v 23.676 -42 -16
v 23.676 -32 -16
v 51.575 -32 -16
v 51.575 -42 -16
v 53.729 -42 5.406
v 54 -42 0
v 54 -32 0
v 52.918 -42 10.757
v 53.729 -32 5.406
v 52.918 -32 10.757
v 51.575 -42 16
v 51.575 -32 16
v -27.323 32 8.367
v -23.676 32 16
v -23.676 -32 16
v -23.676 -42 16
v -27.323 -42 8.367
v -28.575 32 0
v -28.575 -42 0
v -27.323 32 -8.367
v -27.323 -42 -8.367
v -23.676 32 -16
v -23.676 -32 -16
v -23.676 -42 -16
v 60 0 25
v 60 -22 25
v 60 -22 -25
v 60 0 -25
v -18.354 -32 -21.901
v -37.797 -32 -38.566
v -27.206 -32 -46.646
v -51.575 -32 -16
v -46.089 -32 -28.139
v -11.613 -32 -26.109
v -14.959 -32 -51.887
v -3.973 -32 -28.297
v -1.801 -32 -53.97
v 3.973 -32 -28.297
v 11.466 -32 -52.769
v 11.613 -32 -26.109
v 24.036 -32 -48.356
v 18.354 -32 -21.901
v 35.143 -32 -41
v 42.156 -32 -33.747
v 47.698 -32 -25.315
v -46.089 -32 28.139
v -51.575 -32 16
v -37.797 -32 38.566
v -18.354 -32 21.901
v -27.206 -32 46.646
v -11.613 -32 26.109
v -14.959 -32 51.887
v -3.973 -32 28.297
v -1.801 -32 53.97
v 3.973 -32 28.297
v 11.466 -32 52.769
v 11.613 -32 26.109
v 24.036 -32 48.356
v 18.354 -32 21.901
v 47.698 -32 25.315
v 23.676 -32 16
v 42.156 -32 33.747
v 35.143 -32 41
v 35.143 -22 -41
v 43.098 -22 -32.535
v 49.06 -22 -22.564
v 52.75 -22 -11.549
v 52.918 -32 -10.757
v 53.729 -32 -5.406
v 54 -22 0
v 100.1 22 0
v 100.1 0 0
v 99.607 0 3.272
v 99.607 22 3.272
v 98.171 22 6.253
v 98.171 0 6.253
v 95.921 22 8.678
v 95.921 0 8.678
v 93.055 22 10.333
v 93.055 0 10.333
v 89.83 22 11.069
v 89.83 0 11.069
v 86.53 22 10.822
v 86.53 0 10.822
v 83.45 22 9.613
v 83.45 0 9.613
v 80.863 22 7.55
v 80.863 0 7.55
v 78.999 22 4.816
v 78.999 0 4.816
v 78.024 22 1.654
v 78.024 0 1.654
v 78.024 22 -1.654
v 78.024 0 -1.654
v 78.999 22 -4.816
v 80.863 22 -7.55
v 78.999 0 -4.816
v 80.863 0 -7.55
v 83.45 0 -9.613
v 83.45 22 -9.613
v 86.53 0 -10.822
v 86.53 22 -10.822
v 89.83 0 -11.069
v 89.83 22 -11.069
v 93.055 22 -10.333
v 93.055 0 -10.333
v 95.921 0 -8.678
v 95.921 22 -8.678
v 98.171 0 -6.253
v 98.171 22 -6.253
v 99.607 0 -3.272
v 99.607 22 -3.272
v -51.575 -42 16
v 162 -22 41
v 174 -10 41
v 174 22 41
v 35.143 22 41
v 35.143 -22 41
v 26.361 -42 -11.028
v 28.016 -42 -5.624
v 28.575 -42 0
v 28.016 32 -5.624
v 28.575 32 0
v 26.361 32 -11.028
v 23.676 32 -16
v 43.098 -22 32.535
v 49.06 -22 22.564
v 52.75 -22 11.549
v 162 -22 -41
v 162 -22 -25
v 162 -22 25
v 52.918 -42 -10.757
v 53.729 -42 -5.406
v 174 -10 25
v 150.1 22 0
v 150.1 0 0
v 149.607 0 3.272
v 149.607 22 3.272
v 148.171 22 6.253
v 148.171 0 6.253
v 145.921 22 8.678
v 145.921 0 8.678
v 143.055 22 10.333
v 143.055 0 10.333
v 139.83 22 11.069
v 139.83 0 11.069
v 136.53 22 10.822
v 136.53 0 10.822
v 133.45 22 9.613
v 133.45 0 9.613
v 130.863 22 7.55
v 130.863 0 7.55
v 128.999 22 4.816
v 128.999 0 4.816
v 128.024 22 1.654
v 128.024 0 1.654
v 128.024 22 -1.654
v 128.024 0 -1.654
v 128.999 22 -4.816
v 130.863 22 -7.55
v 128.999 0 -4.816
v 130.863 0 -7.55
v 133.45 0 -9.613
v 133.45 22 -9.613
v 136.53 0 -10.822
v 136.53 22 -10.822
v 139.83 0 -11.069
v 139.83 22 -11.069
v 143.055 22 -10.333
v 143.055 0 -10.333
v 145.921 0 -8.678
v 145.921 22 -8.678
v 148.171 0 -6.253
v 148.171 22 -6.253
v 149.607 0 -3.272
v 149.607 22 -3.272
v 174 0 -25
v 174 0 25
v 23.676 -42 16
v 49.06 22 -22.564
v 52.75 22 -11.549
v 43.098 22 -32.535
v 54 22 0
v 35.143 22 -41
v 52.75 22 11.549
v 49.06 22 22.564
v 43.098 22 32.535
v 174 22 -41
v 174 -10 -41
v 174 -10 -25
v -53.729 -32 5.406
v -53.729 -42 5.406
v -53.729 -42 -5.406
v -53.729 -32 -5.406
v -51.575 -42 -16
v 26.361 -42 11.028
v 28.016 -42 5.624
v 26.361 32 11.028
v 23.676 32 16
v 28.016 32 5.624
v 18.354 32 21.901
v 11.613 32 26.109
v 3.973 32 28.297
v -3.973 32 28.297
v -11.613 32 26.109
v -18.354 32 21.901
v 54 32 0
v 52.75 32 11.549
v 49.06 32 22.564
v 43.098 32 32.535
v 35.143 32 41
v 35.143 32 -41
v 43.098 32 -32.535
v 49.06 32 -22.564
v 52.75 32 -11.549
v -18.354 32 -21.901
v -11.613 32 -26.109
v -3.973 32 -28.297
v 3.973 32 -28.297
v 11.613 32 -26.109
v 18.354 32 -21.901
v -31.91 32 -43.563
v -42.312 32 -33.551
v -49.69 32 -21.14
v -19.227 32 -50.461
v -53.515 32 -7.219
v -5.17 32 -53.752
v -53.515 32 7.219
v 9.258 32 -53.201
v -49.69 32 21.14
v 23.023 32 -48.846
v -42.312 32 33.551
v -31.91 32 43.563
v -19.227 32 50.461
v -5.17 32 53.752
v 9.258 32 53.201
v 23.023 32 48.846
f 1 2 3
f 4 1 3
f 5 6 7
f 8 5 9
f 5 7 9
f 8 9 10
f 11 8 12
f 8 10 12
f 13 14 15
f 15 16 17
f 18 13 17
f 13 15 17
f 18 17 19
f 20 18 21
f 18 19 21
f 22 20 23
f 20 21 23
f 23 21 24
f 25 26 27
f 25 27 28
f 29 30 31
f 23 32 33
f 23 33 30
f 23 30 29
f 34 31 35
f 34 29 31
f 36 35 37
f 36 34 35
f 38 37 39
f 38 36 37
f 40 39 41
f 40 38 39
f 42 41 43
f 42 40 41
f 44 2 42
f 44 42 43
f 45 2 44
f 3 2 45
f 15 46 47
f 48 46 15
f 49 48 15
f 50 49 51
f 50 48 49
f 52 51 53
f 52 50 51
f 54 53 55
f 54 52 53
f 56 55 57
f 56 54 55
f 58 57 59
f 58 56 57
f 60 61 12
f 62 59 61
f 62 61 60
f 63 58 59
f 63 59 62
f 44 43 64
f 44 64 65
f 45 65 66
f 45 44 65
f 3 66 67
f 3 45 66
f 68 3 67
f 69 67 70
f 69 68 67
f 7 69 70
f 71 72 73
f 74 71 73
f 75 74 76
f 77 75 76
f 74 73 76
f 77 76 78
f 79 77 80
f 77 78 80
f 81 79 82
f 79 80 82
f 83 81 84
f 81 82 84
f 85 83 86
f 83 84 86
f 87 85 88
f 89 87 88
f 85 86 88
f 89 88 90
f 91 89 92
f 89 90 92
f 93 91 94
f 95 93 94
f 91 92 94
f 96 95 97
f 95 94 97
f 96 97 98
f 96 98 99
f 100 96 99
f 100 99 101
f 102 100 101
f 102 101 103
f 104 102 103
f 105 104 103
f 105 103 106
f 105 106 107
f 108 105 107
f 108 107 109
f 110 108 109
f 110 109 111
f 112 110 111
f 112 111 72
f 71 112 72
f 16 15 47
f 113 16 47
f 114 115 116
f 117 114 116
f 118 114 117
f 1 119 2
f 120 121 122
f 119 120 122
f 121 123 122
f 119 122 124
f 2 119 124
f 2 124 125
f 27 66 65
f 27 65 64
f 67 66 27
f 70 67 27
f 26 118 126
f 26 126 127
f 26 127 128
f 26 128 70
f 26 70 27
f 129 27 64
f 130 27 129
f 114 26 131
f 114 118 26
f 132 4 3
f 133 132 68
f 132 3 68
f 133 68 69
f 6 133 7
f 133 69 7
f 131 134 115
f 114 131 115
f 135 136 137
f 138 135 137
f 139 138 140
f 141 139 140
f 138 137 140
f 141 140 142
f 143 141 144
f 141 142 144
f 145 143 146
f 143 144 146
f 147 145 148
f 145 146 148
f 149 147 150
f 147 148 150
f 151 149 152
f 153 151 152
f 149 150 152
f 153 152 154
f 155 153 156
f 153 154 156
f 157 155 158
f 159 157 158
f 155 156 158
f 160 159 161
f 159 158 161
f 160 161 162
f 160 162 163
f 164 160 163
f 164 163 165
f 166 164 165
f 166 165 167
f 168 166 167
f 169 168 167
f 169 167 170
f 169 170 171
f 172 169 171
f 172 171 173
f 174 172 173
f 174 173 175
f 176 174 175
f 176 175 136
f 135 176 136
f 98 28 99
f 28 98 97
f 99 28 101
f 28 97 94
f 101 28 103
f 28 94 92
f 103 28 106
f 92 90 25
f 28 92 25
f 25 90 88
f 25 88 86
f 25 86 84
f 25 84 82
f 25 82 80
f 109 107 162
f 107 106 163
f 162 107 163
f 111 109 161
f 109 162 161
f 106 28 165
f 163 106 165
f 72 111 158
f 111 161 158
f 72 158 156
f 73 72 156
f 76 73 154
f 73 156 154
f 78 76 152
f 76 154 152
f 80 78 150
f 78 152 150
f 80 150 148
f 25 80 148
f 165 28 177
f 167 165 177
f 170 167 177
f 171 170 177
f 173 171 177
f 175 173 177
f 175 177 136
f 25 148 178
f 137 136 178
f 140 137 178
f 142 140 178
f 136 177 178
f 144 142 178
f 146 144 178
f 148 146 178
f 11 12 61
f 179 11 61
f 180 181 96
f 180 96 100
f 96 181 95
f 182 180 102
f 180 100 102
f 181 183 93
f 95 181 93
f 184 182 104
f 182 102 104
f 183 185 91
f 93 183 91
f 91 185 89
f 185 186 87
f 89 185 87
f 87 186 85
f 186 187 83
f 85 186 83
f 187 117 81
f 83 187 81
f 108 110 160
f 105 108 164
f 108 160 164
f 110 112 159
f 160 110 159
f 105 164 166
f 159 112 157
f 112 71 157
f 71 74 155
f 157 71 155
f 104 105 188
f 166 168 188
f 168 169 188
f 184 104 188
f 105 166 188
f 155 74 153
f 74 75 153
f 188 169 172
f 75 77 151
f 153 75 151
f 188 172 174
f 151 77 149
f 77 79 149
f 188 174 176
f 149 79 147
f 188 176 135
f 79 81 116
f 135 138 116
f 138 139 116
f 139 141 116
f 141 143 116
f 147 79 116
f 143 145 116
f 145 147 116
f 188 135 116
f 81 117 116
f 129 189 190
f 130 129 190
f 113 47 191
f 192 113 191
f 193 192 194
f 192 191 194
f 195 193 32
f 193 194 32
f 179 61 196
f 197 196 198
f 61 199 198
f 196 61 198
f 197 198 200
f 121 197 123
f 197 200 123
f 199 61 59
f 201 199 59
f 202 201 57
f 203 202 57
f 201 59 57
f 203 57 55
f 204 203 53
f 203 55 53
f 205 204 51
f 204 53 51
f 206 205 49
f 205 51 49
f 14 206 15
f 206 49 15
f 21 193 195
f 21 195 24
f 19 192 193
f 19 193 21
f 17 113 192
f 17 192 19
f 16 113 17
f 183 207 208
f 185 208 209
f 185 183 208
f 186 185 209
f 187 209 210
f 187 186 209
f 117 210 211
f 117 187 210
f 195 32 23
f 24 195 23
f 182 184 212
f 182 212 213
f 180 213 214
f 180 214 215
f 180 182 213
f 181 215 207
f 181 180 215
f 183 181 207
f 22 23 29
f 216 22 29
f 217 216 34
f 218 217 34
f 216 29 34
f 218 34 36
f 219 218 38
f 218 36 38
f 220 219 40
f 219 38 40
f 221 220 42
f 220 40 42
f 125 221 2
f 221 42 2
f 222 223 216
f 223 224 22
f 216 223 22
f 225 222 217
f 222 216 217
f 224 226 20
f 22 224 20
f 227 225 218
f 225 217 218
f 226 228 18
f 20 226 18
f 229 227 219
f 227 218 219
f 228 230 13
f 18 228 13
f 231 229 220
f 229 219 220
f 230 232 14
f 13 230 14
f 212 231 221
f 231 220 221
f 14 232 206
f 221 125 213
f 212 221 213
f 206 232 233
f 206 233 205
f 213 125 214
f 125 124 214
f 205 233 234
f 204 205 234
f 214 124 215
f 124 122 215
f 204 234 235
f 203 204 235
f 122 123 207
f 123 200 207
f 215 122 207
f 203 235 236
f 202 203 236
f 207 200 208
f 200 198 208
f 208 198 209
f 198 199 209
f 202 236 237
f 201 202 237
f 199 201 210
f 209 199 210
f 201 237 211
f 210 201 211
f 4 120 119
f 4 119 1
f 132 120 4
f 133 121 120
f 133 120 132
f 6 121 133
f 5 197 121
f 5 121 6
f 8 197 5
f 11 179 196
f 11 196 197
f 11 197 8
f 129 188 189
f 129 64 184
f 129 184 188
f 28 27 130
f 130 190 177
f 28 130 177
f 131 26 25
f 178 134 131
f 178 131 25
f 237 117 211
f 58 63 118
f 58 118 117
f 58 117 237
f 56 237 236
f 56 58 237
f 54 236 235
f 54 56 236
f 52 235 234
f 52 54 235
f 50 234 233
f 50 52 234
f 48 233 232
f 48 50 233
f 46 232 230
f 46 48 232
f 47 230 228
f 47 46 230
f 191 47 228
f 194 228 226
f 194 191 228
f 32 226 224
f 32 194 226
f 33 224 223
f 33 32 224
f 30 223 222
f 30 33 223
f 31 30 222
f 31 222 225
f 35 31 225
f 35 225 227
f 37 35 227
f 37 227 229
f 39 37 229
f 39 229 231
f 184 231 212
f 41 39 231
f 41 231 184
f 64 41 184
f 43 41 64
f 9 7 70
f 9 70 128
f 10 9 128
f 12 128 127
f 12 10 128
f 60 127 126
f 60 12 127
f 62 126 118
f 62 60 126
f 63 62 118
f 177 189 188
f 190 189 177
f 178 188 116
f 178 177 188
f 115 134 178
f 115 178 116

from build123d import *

# Parameters (mm, degrees)
F1_DEPTH  = 22
F0_R      = 28.575
F2_DEPTH  = 32
F3_W      = 22
F3_H      = 50
F4_DEPTH  = 114
F5_R      = 11.1
F6_DEPTH  = 32.001
F8_DEPTH  = 10
F9_DEPTH  = 64.001
F10_SIZE2 = 12
F10_SIZE  = 12


with BuildPart() as f1:
    # F0 (on Front) → F1 (new body, symmetric)
    with BuildSketch(Plane.XZ):
        with BuildLine():
            ThreePointArc((35.142567, 41), (49.05965, 22.564368), (54, 0))
            ThreePointArc((54, 0), (49.05965, -22.564368), (35.142567, -41))
            Line((35.142567, -41), (174, -41))
            Line((174, -41), (174, 41))
            Line((174, 41), (35.142567, 41))
        make_face()
    extrude(amount=F1_DEPTH, both=True)

    # F0 (on Front) → F2 (join, symmetric)
    with BuildSketch(Plane.XZ):
        with BuildLine():
            ThreePointArc((35.142567, -41), (49.05965, -22.564368), (54, 0))
            ThreePointArc((54, 0), (49.05965, 22.564368), (35.142567, 41))
            ThreePointArc((35.142567, 41), (-54, 0), (35.142567, -41))
        make_face()
        Circle(F0_R, mode=Mode.SUBTRACT)
        Circle(F0_R)
    extrude(amount=F2_DEPTH, both=True)

    # F3 (on face) → F4 (cut)
    with BuildSketch(Plane.YZ.offset(174)):
        with Locations((-11, 0)):
            Rectangle(F3_W, F3_H)
    extrude(amount=-F4_DEPTH, mode=Mode.SUBTRACT)

    # F5 (on face) → F6 (cut, through all)
    with BuildSketch(Plane.XZ):
        with Locations((139, 0)):
            Circle(F5_R)
        with Locations((89, 0)):
            Circle(F5_R)
    extrude(amount=-F6_DEPTH, mode=Mode.SUBTRACT)

    # F7 (on face) → F8 (join)
    with BuildSketch(Plane.XZ.offset(32)):
        with BuildLine():
            ThreePointArc((-23.675528, -16), (-28.575, 0), (-23.675528, 16))
            Line((-23.675528, 16), (-51.575188, 16))
            ThreePointArc((-51.575188, 16), (-54, 0), (-51.575188, -16))
            Line((-51.575188, -16), (-23.675528, -16))
        make_face()
        with BuildLine():
            ThreePointArc((23.675528, 16), (27.322691, 8.366672), (28.575, 0))
            ThreePointArc((28.575, 0), (27.322691, -8.366672), (23.675528, -16))
            Line((23.675528, -16), (51.575188, -16))
            ThreePointArc((51.575188, -16), (53.390356, -8.091349), (54, 0))
            ThreePointArc((54, 0), (53.390356, 8.091349), (51.575188, 16))
            Line((51.575188, 16), (23.675528, 16))
        make_face()
    extrude(amount=F8_DEPTH)

    # F7 (on face) → F9 (cut, through all)
    with BuildSketch(Plane.XZ.offset(32)):
        with BuildLine():
            ThreePointArc((23.675528, -16), (27.322691, -8.366672), (28.575, 0))
            ThreePointArc((28.575, 0), (27.322691, 8.366672), (23.675528, 16))
            ThreePointArc((23.675528, 16), (0, 28.575), (-23.675528, 16))
            ThreePointArc((-23.675528, 16), (-28.575, 0), (-23.675528, -16))
            ThreePointArc((-23.675528, -16), (0, -28.575), (23.675528, -16))
        make_face()
    extrude(amount=-F9_DEPTH, mode=Mode.SUBTRACT)

    # F10
    f10_edges = [f1.edges().sort_by_distance(p)[0] for p in [
        (174, -22, -33),
        (174, -22, 33),
    ]]
    chamfer(f10_edges, length=F10_SIZE, length2=F10_SIZE2)


solid = f1.part
